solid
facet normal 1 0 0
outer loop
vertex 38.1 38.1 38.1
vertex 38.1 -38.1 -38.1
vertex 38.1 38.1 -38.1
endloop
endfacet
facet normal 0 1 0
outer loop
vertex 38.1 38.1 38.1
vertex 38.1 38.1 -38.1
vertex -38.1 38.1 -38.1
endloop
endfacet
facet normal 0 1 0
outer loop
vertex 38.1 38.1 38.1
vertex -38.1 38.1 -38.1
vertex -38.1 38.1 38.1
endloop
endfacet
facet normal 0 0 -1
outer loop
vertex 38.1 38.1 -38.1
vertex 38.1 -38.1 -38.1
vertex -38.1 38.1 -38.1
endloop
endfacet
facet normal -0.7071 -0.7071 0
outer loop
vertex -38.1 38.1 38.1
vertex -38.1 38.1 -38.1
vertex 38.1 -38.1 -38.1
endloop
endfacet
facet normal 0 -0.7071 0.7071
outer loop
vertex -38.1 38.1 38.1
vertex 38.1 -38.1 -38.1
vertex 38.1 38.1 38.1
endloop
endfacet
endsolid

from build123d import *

# Parameters (mm, degrees)
F0_W     = 76.2
F0_H     = 76.2
F1_DEPTH = 38.1
F3_DEPTH = 76.2
F5_DEPTH = 76.2


with BuildPart() as f1:
    # F0 (on Right) → F1 (new body, symmetric)
    with BuildSketch(Plane.YZ):
        Rectangle(F0_W, F0_H)
    extrude(amount=F1_DEPTH, both=True)

    # F2 (on face) → F3 (cut)
    with BuildSketch(Plane.YZ.offset(38.1)):
        Polygon((38.1, 38.1), (-38.1, 38.1), (-38.1, -38.1), align=None)
    extrude(amount=-F3_DEPTH, mode=Mode.SUBTRACT)

    # F4 (on face) → F5 (cut)
    with BuildSketch(Plane(origin=(0, 0, -38.1), x_dir=(1, 0, 0), z_dir=(0, 0, -1))):
        Polygon((-38.1, -38.1), (38.1, 38.1), (-38.1, 38.1), align=None)
    extrude(amount=-F5_DEPTH, mode=Mode.SUBTRACT)


solid = f1.part
